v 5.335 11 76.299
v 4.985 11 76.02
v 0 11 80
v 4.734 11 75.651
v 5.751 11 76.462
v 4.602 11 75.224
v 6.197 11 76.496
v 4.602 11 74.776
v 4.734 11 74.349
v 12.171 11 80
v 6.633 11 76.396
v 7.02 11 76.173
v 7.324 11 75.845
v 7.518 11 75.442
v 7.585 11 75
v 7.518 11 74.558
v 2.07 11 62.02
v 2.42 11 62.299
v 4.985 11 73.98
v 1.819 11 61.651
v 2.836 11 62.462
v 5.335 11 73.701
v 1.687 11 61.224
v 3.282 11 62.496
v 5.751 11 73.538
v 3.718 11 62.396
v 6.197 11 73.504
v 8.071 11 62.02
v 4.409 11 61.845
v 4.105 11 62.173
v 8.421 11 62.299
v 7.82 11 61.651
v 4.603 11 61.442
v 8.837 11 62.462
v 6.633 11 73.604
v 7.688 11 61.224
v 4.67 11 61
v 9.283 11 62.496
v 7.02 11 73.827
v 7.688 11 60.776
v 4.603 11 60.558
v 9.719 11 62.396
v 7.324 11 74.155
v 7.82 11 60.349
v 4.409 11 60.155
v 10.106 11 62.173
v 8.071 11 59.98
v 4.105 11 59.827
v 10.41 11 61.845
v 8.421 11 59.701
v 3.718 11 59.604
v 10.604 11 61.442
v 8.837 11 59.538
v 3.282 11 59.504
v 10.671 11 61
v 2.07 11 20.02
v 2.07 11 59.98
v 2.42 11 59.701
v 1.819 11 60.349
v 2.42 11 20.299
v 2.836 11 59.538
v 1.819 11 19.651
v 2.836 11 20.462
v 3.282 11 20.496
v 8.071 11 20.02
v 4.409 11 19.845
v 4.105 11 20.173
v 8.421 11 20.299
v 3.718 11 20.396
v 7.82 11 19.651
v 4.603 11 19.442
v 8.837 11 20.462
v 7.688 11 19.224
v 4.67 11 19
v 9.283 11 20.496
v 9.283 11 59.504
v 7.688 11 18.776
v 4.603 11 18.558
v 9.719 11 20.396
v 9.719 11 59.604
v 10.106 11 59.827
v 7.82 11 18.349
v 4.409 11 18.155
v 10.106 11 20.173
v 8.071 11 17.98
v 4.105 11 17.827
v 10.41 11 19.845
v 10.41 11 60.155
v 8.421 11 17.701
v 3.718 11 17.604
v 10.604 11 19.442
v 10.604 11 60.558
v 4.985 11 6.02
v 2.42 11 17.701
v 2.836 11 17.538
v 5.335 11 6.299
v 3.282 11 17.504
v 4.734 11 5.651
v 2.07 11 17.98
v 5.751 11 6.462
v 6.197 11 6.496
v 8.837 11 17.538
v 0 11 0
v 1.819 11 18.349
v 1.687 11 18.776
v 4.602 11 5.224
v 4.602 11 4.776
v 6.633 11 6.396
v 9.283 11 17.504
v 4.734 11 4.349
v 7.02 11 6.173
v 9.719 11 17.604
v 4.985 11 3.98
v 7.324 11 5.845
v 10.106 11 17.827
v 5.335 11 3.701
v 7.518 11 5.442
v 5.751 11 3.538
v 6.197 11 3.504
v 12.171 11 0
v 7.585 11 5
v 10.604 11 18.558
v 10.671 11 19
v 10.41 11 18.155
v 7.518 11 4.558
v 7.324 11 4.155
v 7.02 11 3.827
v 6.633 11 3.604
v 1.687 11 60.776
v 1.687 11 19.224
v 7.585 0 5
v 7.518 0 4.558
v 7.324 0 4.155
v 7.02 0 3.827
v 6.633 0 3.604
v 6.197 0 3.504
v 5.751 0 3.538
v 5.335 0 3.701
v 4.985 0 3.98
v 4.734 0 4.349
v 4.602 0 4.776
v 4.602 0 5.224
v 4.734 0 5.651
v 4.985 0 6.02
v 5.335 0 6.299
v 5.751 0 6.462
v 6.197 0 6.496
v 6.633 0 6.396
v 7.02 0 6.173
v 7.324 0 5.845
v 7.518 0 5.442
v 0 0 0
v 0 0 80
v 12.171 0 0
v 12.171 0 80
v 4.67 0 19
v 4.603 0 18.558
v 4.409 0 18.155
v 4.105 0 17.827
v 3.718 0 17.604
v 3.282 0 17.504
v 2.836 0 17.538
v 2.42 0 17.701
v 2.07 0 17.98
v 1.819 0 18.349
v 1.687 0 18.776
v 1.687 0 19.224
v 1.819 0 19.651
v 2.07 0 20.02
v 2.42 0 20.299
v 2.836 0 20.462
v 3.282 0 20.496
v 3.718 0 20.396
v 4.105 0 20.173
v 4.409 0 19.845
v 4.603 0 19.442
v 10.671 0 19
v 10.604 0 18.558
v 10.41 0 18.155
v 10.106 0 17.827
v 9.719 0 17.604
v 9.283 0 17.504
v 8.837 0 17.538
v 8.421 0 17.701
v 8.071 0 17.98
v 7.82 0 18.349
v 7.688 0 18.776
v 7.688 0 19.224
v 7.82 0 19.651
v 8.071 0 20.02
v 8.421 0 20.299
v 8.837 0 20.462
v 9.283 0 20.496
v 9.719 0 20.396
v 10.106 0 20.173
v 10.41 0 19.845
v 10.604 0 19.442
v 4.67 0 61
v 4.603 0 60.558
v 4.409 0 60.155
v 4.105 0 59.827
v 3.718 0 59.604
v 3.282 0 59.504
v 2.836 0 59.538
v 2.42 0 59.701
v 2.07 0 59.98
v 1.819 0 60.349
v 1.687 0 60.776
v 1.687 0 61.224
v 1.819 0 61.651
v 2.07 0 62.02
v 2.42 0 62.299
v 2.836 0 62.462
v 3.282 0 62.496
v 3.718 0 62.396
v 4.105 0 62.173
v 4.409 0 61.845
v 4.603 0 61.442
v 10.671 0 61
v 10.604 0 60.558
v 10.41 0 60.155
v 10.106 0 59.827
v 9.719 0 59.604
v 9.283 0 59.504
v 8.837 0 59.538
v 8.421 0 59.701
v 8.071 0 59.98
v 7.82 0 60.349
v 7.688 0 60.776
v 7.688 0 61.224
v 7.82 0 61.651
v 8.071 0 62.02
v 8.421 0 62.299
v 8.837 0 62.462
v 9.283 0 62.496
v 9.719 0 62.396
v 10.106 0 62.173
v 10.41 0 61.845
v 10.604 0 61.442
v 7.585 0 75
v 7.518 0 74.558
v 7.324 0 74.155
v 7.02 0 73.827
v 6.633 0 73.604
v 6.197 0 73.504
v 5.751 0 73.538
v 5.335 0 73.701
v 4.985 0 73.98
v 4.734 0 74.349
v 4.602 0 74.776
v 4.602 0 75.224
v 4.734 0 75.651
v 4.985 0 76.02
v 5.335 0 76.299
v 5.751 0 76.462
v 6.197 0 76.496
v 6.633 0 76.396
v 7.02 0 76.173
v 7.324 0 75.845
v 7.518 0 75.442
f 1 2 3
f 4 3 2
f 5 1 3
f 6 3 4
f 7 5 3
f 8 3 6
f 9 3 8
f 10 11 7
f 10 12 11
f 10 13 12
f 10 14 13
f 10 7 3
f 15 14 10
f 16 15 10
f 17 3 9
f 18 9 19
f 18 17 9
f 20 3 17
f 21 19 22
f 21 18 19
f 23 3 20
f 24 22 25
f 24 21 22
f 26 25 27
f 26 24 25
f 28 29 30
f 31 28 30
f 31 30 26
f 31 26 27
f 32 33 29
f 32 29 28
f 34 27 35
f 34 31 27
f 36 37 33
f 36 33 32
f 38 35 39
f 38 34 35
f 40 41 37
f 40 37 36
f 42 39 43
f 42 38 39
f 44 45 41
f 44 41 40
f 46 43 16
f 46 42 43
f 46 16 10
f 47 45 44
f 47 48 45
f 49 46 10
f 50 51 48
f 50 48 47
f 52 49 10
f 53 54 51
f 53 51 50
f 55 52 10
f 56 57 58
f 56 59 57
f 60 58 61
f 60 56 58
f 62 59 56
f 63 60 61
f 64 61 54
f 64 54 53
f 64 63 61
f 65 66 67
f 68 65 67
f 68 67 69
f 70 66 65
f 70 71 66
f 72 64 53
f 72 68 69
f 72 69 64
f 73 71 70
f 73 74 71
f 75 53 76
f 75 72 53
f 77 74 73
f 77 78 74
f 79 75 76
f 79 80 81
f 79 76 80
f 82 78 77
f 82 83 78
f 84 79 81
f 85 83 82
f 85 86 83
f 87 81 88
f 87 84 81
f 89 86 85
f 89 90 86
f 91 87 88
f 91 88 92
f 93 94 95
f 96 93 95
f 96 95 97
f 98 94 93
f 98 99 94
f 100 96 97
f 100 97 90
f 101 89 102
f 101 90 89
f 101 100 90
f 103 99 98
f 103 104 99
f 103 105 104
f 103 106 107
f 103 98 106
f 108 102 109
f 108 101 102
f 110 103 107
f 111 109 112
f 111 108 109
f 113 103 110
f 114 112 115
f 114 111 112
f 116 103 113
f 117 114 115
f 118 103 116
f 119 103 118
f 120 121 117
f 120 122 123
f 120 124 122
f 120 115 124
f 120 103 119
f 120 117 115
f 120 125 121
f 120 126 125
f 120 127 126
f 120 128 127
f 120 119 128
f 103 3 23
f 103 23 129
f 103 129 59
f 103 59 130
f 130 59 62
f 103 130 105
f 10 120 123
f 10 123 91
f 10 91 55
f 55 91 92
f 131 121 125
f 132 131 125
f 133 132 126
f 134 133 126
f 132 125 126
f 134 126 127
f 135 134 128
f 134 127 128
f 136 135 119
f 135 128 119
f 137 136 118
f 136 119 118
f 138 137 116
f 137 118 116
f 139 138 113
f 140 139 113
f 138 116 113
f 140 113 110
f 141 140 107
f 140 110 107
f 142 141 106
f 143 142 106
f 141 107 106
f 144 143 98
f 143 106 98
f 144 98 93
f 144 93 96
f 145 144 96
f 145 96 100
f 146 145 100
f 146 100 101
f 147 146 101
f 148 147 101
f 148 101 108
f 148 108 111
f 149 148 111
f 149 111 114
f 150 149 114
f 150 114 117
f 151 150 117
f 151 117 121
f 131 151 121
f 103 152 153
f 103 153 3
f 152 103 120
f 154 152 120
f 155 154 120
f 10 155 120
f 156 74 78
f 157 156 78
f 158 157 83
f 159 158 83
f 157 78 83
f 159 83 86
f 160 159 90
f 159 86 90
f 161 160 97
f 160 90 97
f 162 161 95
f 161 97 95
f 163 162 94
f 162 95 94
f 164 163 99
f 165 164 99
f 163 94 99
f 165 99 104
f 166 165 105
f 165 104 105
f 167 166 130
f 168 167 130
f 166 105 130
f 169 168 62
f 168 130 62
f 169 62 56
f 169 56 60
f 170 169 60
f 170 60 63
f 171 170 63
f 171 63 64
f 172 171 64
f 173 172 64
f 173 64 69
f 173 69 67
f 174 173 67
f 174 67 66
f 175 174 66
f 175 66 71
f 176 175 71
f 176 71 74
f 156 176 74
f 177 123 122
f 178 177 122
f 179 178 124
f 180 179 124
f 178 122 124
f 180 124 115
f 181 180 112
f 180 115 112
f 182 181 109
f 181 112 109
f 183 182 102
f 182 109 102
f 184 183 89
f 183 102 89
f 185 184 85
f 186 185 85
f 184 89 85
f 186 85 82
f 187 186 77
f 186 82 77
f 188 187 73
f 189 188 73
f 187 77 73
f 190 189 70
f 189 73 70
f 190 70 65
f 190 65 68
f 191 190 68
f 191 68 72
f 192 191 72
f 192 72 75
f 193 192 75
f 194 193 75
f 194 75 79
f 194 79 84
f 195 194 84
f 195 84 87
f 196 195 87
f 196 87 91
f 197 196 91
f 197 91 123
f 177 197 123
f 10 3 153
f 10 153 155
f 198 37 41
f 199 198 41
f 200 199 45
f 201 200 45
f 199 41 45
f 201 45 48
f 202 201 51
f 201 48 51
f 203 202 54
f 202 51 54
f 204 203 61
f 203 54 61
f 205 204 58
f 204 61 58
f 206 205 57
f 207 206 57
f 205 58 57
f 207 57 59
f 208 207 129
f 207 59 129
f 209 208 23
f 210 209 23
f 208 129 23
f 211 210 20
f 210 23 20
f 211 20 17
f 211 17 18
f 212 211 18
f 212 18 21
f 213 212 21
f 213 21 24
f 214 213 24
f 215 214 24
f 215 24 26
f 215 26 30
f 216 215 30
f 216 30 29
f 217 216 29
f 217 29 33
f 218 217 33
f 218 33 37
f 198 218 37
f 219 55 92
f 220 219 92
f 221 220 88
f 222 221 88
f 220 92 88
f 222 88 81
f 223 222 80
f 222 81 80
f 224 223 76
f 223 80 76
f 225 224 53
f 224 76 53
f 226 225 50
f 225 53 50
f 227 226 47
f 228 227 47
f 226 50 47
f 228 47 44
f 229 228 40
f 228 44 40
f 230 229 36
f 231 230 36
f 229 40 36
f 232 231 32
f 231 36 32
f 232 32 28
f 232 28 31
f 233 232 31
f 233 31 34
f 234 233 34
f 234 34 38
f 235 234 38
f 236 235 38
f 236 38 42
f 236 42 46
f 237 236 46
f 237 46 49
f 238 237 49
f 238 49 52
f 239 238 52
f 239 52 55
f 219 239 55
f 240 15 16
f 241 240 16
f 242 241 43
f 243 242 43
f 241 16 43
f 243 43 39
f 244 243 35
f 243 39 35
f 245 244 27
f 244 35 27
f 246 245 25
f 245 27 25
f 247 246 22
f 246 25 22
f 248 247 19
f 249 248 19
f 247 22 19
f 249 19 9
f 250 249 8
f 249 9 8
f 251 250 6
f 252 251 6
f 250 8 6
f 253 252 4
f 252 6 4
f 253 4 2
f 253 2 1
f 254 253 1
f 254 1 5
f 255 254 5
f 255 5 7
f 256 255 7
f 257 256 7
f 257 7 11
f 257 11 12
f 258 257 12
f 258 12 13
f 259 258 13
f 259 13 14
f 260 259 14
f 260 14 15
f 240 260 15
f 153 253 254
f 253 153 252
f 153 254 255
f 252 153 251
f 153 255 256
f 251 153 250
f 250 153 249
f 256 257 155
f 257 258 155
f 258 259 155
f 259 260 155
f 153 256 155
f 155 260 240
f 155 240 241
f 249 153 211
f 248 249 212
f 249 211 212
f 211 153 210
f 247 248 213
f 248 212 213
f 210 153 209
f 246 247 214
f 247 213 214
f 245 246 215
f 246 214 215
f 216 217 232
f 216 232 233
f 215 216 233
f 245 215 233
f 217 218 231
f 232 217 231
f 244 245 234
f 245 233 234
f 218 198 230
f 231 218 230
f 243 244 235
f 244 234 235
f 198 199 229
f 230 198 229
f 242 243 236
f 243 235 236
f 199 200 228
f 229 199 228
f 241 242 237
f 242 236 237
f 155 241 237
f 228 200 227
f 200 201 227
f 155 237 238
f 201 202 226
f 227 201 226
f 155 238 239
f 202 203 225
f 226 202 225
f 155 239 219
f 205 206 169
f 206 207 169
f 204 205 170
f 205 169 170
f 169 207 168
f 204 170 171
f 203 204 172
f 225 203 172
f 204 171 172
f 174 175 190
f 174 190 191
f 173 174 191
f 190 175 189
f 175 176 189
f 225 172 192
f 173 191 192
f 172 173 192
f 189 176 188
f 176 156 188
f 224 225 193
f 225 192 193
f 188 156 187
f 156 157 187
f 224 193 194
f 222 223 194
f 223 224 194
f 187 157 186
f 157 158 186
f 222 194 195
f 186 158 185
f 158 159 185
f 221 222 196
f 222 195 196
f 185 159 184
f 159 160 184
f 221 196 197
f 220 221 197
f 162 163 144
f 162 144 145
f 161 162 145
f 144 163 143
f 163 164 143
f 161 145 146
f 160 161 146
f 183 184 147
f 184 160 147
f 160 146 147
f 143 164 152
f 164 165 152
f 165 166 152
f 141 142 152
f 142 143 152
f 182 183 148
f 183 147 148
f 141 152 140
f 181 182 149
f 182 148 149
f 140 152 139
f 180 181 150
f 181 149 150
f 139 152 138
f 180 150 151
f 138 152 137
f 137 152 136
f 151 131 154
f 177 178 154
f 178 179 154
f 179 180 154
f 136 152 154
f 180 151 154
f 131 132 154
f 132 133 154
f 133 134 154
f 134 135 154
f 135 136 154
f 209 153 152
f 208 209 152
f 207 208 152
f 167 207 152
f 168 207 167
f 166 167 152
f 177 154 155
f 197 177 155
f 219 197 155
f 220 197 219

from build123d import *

# Parameters (mm, degrees)
SKETCH1_W           = 12.171
SKETCH1_H           = 11
BOSS_EXTRUDE1_DEPTH = 80
SKETCH2_R           = 1.5
CUT_EXTRUDE1_DEPTH  = 15
SKETCH4_R           = 1.5
CUT_EXTRUDE2_DEPTH  = 27


with BuildPart() as part:
    # Sketch1 → Boss-Extrude1 (new body)
    with BuildSketch(Plane.XY):
        with Locations((6.0855, 5.5)):
            Rectangle(SKETCH1_W, SKETCH1_H)
    extrude(amount=BOSS_EXTRUDE1_DEPTH)

    # Sketch2 → Cut-Extrude1 (cut)
    with BuildSketch(Plane(origin=(0, 11, 0), x_dir=(1, 0, 0), z_dir=(0, 1, 0))):
        with Locations((3.17, -61)):
            Circle(SKETCH2_R)
        with Locations((9.171, -61)):
            Circle(SKETCH2_R)
        with Locations((3.17, -19)):
            Circle(SKETCH2_R)
        with Locations((9.171, -19)):
            Circle(SKETCH2_R)
    extrude(amount=-CUT_EXTRUDE1_DEPTH, mode=Mode.SUBTRACT)

    # Sketch4 → Cut-Extrude2 (cut)
    with BuildSketch(Plane(origin=(0, 11, 0), x_dir=(1, 0, 0), z_dir=(0, 1, 0))):
        with Locations((6.085, -75)):
            Circle(SKETCH4_R)
        with Locations((6.085, -5)):
            Circle(SKETCH4_R)
    extrude(amount=-CUT_EXTRUDE2_DEPTH, mode=Mode.SUBTRACT)


solid = part.part
